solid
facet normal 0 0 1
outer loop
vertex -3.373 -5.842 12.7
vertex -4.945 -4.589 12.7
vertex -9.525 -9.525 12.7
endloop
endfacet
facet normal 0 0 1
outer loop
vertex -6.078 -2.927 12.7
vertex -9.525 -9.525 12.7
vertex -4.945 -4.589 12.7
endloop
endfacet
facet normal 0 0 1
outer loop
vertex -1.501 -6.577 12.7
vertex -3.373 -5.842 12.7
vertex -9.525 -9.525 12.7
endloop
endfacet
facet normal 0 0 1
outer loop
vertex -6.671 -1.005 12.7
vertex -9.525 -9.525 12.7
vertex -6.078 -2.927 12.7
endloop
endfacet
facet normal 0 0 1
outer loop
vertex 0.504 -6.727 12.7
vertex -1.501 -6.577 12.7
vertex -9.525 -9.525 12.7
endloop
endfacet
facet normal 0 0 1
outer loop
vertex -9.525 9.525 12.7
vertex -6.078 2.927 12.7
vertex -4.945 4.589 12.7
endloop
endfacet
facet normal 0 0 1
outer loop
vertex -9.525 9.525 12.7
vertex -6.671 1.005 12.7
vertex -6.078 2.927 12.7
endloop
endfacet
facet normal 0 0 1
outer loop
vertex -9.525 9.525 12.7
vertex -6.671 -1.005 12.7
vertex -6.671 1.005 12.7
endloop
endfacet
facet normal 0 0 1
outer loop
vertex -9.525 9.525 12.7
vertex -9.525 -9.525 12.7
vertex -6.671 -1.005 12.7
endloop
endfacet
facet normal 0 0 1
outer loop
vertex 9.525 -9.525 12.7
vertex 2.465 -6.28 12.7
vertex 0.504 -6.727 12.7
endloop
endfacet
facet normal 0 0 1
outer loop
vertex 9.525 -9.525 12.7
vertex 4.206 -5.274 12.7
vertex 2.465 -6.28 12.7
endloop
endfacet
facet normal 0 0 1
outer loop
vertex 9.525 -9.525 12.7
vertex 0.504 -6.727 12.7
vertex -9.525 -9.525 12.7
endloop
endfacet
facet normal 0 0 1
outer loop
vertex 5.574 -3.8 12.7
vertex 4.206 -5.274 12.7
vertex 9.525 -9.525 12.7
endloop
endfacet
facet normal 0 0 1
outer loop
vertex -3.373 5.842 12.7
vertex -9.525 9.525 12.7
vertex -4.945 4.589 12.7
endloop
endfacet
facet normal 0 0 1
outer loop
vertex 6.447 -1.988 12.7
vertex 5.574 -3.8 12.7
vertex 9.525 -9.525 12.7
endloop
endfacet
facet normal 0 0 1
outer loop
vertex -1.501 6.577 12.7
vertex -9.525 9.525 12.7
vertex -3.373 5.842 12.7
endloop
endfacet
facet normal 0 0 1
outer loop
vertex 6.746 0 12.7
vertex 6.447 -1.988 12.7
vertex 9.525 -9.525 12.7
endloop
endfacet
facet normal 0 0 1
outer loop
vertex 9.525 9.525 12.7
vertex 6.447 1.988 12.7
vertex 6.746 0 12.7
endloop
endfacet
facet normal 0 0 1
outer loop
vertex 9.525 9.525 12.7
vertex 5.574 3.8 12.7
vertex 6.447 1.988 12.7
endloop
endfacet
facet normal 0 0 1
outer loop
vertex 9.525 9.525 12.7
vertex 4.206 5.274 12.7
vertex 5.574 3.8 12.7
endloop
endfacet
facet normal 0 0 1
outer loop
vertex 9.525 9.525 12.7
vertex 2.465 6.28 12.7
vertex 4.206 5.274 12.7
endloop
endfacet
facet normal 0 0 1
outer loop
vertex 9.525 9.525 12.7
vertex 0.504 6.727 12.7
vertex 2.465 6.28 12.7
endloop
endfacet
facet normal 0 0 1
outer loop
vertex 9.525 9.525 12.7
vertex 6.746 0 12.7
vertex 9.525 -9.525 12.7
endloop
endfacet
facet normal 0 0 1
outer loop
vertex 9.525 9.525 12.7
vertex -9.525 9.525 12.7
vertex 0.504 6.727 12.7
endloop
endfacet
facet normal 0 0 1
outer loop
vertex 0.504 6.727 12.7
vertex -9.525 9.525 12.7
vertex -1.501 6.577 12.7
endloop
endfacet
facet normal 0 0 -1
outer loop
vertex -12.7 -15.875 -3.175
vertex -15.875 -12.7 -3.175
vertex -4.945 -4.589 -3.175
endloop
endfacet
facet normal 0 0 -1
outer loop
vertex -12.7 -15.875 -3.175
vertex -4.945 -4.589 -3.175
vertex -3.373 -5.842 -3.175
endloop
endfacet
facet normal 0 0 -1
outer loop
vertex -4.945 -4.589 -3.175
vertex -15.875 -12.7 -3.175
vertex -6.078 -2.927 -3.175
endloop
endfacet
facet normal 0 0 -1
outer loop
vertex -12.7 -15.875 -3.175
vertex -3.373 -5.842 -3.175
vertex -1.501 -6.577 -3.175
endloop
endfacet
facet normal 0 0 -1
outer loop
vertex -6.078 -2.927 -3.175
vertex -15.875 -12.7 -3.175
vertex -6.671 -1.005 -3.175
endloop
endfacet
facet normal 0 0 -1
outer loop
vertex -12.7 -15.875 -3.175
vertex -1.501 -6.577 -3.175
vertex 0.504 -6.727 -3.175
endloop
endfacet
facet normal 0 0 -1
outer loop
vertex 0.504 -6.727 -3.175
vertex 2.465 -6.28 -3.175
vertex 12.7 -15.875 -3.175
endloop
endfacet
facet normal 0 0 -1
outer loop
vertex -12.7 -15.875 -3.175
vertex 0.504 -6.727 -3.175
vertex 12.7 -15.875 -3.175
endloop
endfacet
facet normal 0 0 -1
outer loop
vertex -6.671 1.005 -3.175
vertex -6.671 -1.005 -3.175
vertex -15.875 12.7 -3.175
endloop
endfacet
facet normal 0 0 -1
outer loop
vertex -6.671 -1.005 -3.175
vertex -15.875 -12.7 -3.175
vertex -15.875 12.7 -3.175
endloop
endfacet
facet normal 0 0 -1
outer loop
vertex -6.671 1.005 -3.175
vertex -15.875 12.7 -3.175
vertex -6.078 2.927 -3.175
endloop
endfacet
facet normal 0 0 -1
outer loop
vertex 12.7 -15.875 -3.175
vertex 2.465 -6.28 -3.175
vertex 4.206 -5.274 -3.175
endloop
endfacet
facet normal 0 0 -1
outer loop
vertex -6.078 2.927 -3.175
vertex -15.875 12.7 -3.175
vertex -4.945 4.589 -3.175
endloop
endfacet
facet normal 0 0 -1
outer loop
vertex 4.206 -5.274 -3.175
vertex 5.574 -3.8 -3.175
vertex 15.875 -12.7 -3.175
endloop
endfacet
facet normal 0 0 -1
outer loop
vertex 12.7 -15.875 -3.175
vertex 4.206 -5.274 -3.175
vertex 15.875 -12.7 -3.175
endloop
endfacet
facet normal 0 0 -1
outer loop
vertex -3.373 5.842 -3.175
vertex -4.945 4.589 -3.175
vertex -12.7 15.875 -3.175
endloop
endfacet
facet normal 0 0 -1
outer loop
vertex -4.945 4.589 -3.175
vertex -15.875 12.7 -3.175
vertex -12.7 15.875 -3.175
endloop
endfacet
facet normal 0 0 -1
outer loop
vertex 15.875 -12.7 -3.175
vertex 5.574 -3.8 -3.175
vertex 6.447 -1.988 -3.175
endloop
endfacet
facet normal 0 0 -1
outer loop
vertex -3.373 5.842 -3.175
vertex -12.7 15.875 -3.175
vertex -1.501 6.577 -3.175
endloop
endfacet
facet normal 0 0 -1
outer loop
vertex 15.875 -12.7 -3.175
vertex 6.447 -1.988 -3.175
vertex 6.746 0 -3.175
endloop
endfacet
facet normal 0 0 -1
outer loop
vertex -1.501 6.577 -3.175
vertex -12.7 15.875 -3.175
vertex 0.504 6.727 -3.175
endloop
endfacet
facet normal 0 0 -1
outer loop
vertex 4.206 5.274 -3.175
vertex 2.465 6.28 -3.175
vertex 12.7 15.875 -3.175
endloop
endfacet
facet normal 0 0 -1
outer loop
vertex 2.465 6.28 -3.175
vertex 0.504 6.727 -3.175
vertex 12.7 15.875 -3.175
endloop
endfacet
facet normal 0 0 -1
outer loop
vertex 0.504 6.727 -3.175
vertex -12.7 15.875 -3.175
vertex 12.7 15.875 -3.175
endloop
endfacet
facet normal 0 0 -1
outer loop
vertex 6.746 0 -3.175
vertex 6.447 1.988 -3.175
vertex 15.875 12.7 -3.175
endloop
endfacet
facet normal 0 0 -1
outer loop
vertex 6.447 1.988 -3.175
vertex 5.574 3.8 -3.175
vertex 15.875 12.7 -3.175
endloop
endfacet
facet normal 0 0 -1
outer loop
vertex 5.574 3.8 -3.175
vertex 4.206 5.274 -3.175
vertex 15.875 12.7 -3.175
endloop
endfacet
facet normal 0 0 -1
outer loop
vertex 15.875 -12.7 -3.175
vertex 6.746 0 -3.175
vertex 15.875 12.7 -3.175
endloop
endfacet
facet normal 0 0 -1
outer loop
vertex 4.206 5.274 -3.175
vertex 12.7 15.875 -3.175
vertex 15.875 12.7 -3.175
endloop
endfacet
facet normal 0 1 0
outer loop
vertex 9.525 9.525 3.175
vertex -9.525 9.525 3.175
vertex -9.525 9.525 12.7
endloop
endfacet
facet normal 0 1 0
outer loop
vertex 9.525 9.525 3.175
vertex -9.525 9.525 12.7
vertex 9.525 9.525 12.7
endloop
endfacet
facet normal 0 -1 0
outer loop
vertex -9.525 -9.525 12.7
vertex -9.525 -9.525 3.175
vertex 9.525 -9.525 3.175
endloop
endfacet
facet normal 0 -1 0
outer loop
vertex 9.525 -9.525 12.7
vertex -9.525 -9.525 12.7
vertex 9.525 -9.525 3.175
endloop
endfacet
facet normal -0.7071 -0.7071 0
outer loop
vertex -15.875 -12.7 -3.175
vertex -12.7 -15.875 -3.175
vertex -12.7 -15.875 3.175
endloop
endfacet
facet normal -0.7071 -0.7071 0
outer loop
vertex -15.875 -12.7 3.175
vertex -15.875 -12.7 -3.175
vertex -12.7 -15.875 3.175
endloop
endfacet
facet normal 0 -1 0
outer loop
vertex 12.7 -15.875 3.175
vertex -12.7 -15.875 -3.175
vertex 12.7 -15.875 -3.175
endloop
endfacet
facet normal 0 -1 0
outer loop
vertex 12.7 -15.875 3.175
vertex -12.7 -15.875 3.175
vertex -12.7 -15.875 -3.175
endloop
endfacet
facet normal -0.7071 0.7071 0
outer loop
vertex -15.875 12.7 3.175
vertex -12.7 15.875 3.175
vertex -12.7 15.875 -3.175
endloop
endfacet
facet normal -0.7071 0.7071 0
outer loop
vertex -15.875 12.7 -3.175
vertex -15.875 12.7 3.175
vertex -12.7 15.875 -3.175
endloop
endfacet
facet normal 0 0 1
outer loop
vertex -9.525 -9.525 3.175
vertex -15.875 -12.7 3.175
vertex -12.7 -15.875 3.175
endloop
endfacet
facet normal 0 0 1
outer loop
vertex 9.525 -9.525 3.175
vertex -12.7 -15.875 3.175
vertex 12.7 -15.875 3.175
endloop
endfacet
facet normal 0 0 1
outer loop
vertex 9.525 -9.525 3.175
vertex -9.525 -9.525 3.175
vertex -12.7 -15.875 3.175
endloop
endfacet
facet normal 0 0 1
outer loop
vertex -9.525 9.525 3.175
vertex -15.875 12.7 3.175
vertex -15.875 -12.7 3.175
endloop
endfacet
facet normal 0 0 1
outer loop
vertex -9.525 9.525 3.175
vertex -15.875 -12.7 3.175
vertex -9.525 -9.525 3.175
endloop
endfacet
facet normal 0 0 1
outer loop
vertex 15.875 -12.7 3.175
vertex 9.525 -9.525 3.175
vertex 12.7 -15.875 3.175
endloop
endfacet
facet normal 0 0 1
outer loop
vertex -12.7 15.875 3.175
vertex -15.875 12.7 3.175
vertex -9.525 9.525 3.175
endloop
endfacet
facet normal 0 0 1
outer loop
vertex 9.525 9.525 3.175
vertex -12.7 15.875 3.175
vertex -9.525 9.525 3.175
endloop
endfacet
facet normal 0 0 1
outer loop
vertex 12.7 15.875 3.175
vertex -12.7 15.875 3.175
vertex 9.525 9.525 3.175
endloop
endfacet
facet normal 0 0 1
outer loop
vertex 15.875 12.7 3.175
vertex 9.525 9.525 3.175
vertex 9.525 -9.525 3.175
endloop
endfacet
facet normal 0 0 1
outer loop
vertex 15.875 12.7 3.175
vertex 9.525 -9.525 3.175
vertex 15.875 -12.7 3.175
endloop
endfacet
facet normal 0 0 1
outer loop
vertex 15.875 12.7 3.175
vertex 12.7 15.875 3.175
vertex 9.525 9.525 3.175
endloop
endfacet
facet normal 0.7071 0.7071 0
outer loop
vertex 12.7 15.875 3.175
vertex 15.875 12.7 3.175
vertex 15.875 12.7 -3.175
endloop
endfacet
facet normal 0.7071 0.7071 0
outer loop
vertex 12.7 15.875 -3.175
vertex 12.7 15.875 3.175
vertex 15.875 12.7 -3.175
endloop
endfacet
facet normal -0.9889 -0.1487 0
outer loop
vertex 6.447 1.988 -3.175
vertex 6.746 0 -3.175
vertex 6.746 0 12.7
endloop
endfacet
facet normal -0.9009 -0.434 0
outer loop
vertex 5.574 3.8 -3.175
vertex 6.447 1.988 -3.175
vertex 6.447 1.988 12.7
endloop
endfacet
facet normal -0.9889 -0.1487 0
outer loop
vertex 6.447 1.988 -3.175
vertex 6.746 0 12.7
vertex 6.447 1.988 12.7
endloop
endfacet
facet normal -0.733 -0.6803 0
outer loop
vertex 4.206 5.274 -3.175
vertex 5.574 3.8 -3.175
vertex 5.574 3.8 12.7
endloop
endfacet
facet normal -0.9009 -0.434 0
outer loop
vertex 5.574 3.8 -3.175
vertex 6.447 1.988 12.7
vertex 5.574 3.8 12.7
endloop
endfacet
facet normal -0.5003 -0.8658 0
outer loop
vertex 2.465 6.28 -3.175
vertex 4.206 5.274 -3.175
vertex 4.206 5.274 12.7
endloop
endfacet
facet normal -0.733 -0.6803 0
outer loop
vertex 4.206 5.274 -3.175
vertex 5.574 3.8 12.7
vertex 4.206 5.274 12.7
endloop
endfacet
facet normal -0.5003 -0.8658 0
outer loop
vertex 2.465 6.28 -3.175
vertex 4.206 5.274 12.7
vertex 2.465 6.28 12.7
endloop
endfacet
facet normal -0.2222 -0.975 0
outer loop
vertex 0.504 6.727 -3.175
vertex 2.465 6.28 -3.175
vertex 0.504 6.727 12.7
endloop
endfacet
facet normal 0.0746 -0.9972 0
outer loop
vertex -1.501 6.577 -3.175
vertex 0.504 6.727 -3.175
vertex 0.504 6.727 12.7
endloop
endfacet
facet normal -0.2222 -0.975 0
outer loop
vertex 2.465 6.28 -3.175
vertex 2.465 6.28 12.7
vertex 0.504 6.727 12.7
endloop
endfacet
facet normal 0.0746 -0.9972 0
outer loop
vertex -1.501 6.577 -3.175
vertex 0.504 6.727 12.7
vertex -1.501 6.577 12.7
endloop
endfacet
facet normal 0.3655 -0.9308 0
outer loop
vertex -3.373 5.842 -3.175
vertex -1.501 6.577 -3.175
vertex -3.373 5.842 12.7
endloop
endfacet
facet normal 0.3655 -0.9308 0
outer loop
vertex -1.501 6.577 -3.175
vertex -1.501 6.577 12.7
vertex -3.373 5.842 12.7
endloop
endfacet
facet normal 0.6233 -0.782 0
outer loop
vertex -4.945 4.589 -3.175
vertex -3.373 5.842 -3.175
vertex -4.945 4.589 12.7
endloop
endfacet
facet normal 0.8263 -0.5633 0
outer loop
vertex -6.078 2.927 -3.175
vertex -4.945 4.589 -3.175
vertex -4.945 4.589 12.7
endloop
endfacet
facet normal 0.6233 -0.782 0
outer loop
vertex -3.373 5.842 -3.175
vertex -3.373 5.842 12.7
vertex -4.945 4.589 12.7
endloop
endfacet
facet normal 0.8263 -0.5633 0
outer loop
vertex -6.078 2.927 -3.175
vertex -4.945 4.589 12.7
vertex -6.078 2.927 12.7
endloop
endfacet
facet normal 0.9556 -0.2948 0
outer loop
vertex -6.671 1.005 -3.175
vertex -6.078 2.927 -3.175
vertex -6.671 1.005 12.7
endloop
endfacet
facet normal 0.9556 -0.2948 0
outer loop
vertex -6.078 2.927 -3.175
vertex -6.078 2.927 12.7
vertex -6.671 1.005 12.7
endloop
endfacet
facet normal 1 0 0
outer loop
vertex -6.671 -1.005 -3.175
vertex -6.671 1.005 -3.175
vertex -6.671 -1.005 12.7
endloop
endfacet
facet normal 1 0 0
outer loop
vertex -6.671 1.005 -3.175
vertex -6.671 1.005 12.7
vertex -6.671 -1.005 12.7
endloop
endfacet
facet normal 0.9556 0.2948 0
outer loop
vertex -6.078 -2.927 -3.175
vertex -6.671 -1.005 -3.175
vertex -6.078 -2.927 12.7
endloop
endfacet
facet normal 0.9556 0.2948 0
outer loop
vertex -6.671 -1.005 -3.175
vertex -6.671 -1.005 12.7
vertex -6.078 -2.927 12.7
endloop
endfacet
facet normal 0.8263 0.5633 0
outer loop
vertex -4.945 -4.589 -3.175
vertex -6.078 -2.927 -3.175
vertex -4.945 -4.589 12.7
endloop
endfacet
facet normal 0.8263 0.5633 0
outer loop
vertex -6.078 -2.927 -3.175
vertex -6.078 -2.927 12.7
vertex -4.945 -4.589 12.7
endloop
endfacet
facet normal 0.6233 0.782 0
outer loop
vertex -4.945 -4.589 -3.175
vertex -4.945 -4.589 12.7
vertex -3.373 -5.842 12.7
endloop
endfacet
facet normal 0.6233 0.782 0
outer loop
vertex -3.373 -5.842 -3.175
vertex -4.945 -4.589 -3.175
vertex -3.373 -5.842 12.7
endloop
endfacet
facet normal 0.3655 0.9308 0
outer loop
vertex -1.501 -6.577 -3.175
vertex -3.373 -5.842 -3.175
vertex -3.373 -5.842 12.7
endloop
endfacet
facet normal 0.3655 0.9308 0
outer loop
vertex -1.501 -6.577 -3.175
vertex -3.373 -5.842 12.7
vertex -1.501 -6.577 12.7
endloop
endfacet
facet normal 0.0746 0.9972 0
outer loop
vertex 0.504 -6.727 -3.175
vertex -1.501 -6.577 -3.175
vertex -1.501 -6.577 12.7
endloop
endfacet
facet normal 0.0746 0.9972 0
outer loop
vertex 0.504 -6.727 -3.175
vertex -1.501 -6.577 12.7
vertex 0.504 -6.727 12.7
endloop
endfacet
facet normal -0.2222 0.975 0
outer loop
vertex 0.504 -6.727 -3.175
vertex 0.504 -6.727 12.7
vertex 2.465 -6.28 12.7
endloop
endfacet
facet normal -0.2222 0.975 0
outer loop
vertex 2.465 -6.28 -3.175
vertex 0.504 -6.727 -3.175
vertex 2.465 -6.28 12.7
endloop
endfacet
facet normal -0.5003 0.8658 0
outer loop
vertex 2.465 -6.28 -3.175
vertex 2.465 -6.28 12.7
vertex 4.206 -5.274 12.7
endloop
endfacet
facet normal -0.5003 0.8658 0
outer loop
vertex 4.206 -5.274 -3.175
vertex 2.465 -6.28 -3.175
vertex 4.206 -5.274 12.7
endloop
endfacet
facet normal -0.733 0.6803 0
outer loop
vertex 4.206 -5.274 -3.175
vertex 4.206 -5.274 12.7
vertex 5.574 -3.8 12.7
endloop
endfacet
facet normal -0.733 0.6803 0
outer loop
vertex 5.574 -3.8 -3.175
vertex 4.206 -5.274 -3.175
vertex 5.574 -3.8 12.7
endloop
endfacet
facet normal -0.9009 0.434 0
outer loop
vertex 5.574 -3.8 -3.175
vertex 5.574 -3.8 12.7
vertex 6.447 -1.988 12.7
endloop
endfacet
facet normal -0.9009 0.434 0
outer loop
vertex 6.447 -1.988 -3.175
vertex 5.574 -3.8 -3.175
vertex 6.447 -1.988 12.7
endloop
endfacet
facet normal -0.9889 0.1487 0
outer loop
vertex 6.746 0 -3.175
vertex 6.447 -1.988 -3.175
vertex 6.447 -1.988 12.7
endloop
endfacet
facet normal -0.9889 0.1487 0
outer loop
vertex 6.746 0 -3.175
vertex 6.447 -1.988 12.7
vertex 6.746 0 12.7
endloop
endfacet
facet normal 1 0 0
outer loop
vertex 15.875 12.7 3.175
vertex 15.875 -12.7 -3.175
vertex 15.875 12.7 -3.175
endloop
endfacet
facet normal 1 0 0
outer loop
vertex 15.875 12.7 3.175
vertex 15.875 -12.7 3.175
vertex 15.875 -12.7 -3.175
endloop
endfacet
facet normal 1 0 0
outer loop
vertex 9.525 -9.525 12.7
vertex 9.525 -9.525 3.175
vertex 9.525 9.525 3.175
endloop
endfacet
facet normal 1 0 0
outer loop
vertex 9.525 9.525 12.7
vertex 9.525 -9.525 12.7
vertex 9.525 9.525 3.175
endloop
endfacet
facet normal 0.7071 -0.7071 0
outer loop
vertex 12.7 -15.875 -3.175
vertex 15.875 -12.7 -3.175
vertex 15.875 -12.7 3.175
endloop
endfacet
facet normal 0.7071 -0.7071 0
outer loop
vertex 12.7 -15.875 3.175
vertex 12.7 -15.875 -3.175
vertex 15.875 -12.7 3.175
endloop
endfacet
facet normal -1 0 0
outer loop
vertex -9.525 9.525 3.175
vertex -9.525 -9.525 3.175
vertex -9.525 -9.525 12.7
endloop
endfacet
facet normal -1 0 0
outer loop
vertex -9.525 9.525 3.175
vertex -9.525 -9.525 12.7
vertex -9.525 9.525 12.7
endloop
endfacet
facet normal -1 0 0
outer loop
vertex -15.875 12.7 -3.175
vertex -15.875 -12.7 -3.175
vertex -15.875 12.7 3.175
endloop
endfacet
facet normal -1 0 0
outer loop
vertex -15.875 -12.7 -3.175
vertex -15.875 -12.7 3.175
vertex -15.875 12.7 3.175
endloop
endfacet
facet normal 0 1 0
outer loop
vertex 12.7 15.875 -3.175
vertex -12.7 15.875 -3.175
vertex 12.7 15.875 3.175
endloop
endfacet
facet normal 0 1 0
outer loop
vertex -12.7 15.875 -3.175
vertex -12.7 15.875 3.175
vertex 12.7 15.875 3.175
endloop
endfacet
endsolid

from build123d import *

# Parameters (mm, degrees)
SKETCH1_W               = 31.75
SKETCH1_H               = 31.75
BOSS_EXTRUDE1_DEPTH     = 3.175
SKETCH4_W               = 19.05
SKETCH4_H               = 19.05
BOSS_EXTRUDE2_DEPTH     = 9.525
F_5_8_11_TAPPED_HOLE2_D = 13.49248
CHAMFER1_SIZE           = 3.175


with BuildPart() as part:
    # Sketch1 → Boss-Extrude1 (new, symmetric)
    with BuildSketch(Plane.XY):
        Rectangle(SKETCH1_W, SKETCH1_H)
    extrude(amount=BOSS_EXTRUDE1_DEPTH, both=True)

    # Sketch4 → Boss-Extrude2 (add)
    with BuildSketch(Plane.XY.offset(3.175)):
        Rectangle(SKETCH4_W, SKETCH4_H)
    extrude(amount=BOSS_EXTRUDE2_DEPTH)

    # 5/8-11 Tapped Hole2 (through all)
    with Locations(Plane(origin=(0, 0, -3.175), x_dir=(-1, 0, 0), z_dir=(0, 0, -1))):
        with Locations((0, 0)):
            Hole(F_5_8_11_TAPPED_HOLE2_D / 2)

    # Chamfer1
    chamfer1_edges = [part.edges().sort_by_distance(p)[0] for p in [
        (-15.875, 15.875, 0),
        (15.875, 15.875, 0),
        (15.875, -15.875, 0),
        (-15.875, -15.875, 0),
    ]]
    chamfer(chamfer1_edges, length=CHAMFER1_SIZE)


solid = part.part
